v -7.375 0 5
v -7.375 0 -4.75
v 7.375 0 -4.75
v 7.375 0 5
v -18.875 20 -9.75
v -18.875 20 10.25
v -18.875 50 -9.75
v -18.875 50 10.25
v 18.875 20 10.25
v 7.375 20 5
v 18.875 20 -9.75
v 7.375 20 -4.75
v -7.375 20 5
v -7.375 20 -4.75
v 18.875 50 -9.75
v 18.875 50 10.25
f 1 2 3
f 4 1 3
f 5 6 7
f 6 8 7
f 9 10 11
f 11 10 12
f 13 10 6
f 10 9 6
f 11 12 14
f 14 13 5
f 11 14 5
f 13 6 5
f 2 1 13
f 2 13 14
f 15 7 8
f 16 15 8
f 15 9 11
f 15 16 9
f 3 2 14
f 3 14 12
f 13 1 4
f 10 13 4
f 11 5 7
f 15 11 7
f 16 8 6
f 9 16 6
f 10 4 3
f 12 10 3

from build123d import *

# Parameters (mm, degrees)
SKETCH1_W                = 14.75
SKETCH1_H                = 9.75
BOSS_EXTRUDE1_DEPTH      = 50
BOSS_EXTRUDE2_DEPTH      = 18.875
BOSS_EXTRUDE2_DEPTH_BACK = 18.875


with BuildPart() as part:
    # Sketch1 → Boss-Extrude1 (new body)
    with BuildSketch(Plane(origin=(0, 0, 0), x_dir=(1, 0, 0), z_dir=(0, 1, 0))):
        with Locations((0, -0.125)):
            Rectangle(SKETCH1_W, SKETCH1_H)
    extrude(amount=BOSS_EXTRUDE1_DEPTH)

    # Sketch3 → Boss-Extrude2 (add, two sides: drawn at the far end of the back side and taken through both)
    with BuildSketch(Plane(origin=(0, 0, 0), x_dir=(0, 0, -1), z_dir=(1, 0, 0)).offset(-BOSS_EXTRUDE2_DEPTH_BACK)):
        Polygon((-10.25, 20), (-5.25, 20), (9.75, 20), (9.75, 50), (-10.25, 50), align=None)
    extrude(amount=BOSS_EXTRUDE2_DEPTH + BOSS_EXTRUDE2_DEPTH_BACK)


solid = part.part
